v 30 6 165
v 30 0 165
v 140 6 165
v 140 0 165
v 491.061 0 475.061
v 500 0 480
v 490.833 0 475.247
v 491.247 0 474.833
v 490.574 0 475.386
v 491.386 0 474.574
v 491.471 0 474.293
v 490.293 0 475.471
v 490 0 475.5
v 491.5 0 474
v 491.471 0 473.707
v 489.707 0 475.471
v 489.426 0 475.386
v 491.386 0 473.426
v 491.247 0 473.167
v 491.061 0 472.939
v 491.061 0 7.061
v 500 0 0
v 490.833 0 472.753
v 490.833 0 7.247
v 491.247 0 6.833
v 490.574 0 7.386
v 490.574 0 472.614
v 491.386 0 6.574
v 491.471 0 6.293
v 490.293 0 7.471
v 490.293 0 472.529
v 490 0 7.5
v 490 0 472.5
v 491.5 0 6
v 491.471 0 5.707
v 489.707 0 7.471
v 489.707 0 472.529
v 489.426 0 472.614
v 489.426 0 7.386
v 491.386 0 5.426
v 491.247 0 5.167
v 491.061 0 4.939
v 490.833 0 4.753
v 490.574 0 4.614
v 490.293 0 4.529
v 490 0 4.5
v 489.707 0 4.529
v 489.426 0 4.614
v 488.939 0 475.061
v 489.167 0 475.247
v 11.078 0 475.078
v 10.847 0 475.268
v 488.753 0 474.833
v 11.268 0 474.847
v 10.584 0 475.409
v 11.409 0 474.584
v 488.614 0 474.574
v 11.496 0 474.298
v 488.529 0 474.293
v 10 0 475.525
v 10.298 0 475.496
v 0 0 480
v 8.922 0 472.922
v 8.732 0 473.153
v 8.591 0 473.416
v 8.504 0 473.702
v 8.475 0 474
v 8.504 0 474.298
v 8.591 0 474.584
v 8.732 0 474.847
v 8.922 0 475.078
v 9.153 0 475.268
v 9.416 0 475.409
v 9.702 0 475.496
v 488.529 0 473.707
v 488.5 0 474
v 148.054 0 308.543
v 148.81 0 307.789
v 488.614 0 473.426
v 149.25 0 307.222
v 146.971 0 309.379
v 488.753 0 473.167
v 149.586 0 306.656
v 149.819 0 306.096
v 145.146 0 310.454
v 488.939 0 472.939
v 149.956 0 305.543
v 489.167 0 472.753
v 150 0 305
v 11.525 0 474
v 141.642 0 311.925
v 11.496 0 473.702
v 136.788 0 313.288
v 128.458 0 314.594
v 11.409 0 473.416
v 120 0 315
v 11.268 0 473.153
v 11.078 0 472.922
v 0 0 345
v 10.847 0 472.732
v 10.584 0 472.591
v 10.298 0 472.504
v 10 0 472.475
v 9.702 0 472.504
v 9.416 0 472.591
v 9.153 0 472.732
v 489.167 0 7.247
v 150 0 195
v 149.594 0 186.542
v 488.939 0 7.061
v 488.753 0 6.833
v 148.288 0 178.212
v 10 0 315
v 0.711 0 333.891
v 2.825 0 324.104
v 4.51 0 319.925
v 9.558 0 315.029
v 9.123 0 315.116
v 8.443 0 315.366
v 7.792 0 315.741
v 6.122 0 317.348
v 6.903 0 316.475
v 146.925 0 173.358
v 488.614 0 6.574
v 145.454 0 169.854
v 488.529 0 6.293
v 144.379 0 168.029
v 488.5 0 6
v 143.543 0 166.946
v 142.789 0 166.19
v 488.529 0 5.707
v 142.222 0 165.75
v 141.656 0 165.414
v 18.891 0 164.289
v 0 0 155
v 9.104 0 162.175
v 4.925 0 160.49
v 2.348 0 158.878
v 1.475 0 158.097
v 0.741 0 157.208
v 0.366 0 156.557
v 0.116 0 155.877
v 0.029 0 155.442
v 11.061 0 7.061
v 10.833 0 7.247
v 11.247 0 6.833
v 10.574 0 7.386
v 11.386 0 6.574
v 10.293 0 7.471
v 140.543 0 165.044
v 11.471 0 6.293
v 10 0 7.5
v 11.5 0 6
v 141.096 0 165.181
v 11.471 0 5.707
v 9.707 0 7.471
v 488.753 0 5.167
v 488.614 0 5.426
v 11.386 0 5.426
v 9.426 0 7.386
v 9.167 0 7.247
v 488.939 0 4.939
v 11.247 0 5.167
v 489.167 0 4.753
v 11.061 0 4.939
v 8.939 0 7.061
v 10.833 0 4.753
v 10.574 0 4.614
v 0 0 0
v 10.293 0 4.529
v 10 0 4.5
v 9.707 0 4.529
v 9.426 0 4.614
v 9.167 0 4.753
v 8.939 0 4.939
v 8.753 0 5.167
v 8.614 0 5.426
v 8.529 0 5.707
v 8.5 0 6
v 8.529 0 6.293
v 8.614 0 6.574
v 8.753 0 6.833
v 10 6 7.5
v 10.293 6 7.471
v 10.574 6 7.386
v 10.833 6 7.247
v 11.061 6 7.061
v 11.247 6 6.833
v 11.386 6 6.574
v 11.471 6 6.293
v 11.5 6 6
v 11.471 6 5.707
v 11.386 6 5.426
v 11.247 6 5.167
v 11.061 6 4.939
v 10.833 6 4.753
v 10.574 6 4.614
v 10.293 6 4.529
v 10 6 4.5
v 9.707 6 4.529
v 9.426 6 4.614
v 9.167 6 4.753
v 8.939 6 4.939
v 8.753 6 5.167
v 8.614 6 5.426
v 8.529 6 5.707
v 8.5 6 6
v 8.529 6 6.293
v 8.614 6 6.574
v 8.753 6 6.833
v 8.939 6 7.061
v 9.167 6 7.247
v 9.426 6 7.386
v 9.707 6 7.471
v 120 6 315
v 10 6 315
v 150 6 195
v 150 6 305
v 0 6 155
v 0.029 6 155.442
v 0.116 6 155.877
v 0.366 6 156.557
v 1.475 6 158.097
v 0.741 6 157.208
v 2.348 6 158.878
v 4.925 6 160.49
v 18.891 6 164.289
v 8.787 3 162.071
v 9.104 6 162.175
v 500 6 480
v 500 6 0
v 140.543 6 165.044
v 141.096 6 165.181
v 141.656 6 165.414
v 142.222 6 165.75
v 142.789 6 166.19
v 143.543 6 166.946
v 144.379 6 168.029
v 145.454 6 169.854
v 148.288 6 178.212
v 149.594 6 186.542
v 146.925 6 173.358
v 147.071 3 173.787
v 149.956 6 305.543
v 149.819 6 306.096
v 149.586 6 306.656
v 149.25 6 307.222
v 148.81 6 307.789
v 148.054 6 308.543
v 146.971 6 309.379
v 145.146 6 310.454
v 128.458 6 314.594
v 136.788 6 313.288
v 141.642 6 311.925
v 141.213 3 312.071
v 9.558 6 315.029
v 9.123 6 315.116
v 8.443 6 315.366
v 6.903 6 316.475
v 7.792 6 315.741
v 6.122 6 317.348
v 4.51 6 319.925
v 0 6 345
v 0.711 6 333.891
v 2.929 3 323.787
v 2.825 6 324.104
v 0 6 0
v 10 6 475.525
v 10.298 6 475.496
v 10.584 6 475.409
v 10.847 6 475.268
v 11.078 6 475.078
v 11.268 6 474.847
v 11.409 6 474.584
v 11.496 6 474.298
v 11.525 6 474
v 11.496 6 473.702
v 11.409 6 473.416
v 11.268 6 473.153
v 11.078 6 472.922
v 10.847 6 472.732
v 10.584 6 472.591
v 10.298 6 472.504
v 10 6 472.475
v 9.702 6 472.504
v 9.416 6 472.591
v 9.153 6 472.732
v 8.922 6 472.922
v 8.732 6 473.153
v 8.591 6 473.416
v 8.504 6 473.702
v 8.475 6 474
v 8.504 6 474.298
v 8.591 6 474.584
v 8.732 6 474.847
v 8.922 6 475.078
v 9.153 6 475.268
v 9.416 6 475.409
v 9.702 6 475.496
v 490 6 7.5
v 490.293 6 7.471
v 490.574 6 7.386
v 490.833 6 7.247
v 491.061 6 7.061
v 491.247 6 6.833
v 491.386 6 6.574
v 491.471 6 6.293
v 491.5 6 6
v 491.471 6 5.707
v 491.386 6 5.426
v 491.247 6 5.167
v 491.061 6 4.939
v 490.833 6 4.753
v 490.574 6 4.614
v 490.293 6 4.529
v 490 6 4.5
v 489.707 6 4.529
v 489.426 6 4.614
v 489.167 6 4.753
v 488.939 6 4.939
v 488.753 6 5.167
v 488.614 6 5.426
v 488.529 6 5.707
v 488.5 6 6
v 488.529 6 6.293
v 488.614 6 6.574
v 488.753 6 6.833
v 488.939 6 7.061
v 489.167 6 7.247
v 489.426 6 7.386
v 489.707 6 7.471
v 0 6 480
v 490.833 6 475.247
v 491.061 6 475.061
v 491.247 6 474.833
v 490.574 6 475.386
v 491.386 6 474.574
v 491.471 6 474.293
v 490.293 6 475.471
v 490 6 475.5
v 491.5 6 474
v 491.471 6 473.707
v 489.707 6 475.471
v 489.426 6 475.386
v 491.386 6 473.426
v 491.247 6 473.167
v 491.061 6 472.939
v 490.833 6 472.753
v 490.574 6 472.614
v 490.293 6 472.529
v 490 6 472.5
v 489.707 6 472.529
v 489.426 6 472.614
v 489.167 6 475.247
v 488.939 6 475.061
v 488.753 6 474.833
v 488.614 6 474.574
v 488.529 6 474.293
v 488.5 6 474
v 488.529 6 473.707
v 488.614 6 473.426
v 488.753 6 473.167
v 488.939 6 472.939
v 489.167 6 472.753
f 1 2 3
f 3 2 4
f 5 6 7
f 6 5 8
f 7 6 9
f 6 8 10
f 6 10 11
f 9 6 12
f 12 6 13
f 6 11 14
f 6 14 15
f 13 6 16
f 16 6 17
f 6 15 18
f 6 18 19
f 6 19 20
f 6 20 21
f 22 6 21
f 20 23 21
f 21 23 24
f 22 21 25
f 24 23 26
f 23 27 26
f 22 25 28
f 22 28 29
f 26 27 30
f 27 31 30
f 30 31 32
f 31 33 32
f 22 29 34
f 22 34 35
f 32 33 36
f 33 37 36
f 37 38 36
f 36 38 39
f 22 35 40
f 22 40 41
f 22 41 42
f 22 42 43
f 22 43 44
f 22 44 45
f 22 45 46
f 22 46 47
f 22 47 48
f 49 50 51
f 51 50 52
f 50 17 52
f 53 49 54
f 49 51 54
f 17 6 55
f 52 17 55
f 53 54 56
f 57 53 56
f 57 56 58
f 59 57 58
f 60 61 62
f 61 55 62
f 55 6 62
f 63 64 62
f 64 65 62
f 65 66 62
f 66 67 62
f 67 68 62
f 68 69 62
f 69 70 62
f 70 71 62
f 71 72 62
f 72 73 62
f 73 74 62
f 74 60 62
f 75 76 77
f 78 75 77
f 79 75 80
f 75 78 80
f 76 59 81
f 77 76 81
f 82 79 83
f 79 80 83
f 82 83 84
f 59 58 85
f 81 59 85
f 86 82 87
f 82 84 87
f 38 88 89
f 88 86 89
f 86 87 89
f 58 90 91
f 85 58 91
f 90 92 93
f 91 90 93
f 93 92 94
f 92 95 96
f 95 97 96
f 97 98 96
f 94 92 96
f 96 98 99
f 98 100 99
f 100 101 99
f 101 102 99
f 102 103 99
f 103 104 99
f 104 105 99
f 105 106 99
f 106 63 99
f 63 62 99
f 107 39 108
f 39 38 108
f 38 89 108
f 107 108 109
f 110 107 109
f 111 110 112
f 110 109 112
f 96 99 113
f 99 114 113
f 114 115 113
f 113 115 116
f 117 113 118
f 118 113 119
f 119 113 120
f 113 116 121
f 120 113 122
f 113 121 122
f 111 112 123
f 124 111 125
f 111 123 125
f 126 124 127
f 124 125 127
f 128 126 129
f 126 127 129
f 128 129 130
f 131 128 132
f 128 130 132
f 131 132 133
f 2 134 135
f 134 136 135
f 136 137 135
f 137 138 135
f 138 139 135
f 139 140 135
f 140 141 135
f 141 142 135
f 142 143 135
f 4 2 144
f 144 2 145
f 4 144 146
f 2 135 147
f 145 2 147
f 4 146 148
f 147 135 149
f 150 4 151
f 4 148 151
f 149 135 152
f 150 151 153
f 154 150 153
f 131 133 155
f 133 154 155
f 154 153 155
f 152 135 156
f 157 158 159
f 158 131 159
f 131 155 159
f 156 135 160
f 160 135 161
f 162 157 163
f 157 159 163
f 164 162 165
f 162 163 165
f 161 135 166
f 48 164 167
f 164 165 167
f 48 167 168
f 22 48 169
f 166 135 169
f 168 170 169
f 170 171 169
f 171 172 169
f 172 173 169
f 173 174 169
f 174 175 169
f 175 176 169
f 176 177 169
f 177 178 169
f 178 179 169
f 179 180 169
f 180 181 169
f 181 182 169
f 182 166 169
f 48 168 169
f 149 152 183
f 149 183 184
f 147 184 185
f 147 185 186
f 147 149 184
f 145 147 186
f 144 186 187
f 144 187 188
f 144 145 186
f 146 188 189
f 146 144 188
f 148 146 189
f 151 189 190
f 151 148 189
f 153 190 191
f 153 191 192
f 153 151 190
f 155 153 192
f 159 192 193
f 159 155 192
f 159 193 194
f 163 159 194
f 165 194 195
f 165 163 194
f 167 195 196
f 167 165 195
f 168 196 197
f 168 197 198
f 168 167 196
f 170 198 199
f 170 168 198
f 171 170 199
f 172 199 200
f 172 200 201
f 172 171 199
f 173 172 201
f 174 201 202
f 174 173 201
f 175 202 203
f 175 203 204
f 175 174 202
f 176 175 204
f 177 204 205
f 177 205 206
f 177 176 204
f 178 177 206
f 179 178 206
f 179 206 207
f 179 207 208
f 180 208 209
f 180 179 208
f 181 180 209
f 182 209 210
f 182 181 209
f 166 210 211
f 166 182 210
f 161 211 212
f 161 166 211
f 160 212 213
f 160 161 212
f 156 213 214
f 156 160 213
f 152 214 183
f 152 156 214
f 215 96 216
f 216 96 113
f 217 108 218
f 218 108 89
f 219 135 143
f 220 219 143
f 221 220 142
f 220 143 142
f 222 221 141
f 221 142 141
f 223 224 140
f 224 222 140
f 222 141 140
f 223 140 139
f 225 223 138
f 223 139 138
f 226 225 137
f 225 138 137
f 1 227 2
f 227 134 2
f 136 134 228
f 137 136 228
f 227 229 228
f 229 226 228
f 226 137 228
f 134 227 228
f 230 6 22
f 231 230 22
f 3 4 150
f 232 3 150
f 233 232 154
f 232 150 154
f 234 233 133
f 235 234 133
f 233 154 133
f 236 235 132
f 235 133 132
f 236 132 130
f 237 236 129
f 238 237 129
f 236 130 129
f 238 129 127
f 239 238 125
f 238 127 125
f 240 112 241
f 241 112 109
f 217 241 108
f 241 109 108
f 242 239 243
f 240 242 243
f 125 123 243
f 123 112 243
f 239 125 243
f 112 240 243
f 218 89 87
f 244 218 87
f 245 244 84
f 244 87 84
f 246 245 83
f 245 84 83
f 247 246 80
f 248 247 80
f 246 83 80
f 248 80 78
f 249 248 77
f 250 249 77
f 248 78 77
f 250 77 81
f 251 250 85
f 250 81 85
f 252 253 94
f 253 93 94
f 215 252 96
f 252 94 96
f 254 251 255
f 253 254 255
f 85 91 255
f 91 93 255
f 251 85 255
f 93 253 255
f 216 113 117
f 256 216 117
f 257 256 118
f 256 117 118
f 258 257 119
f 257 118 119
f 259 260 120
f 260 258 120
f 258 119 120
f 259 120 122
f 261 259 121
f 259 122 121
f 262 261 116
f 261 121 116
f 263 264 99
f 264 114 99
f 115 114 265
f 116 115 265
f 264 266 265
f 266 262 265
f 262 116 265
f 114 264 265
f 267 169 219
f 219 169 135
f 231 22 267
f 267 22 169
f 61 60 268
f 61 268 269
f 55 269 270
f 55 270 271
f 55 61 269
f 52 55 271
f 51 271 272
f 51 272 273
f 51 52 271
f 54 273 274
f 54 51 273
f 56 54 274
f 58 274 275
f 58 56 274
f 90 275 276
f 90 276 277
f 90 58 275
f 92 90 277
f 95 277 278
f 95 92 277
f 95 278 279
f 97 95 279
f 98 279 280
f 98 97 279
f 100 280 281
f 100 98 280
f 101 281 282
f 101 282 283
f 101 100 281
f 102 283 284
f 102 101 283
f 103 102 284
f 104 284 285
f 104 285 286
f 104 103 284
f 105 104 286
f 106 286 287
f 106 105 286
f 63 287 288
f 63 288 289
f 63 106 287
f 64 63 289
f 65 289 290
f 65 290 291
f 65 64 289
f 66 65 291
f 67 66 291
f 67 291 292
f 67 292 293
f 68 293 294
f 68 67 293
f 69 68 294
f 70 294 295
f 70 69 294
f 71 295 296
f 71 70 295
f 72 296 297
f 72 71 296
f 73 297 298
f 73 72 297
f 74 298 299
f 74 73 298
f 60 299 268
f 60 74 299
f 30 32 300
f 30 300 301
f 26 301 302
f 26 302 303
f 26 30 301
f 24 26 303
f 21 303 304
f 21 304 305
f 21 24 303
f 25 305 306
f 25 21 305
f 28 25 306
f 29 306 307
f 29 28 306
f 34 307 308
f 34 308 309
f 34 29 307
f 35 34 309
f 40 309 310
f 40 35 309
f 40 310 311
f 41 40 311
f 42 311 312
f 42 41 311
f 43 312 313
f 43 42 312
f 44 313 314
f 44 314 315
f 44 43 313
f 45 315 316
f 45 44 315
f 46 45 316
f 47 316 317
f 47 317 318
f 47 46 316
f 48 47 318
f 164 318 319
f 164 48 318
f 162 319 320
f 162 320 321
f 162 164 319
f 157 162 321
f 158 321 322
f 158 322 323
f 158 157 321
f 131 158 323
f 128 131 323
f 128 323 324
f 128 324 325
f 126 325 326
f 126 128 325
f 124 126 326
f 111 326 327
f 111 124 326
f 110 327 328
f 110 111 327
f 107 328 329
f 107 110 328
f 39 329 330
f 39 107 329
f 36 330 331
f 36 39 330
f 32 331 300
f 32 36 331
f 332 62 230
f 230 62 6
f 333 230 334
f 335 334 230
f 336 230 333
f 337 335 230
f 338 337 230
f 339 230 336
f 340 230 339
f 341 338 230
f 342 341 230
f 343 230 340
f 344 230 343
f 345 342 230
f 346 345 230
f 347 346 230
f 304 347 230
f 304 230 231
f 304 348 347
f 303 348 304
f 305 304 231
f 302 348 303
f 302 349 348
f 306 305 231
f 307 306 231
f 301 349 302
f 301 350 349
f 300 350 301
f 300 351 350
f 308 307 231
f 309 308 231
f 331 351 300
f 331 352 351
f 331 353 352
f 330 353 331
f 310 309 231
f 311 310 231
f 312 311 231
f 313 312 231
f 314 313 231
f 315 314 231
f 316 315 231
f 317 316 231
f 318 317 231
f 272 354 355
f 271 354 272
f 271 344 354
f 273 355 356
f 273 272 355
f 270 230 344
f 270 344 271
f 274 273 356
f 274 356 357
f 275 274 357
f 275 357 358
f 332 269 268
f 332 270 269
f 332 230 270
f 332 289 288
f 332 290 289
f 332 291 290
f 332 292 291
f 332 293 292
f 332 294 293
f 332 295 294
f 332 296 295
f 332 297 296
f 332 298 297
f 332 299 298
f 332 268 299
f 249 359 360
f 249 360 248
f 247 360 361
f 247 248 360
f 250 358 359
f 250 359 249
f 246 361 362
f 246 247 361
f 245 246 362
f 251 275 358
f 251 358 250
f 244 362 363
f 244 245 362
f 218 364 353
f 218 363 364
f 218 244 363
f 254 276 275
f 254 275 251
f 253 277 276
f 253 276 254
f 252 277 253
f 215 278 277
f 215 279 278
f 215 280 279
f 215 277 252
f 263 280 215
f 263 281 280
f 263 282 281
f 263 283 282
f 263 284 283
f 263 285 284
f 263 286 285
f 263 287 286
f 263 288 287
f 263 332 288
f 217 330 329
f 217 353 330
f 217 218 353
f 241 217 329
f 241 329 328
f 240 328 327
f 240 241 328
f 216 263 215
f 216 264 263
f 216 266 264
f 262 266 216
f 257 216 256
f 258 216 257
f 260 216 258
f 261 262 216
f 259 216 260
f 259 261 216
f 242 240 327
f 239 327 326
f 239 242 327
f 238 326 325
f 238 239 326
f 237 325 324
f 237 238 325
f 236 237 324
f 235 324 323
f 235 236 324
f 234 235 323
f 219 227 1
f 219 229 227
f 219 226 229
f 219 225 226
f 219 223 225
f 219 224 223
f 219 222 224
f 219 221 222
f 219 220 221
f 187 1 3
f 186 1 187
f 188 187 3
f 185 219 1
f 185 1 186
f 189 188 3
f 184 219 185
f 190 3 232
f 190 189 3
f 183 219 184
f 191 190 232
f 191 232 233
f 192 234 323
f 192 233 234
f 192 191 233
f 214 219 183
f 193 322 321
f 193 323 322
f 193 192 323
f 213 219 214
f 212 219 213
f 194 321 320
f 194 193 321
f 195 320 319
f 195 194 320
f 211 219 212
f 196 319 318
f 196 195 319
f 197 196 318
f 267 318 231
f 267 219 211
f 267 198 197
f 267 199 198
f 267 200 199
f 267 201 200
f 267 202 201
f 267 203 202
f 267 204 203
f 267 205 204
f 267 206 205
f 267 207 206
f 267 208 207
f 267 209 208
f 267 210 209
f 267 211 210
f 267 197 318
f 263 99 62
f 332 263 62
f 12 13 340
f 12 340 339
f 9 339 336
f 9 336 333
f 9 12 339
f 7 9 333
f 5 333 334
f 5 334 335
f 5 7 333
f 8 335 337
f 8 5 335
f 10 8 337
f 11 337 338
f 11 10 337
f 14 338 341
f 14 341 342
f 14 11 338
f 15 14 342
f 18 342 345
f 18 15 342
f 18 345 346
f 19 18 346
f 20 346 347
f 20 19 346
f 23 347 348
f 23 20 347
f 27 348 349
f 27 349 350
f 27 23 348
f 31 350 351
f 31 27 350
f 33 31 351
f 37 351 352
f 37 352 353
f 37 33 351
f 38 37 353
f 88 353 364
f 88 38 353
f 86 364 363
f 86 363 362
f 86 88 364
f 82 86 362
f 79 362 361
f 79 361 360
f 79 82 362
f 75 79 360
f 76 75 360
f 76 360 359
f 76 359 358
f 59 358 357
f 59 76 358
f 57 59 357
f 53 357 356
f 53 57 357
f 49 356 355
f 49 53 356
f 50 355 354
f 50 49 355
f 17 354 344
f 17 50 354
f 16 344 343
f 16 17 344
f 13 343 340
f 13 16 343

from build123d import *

# Parameters (mm, degrees)
SKETCH1_R           = 1.525
SKETCH1_R_2         = 1.5
BOSS_EXTRUDE1_DEPTH = 6
FILLET1_SIZE        = 10
FILLET1_SIZE_2      = 30


with BuildPart() as part:
    # Sketch1 → Boss-Extrude1 (new body)
    with BuildSketch(Plane(origin=(0, 0, 0), x_dir=(1, 0, 0), z_dir=(0, 1, 0))):
        Polygon((500, 0), (0, 0), (0, -165), (150, -165), (150, -315), (0, -315), (0, -480), (500, -480), align=None)
        with Locations(Location((10, -474, 0), (0, 0, 270))):
            Circle(SKETCH1_R, mode=Mode.SUBTRACT)
        with Locations(Location((490, -474, 0), (0, 0, 270))):
            Circle(SKETCH1_R_2, mode=Mode.SUBTRACT)
        with Locations(Location((10, -6, 0), (0, 0, 270))):
            Circle(SKETCH1_R_2, mode=Mode.SUBTRACT)
        with Locations(Location((490, -6, 0), (0, 0, 270))):
            Circle(SKETCH1_R_2, mode=Mode.SUBTRACT)
    extrude(amount=BOSS_EXTRUDE1_DEPTH)

    # Fillet1
    # an asymmetric fillet: 30, 10 mm, written as the material it adds along each edge
    with BuildSketch(Plane(origin=(150, 0, 315), x_dir=(0, 0, -1), z_dir=(0, 1, 0)), Plane(origin=(150, 0, 165), x_dir=(-1, 0, 0), z_dir=(0, 1, 0))) as fillet1_piece_1:
        with BuildLine():
            Bezier((FILLET1_SIZE, 0), (0, 0), (0, FILLET1_SIZE_2), weights=[1, 0.707106781, 1])
            Line((0, FILLET1_SIZE_2), (0, 0))
            Line((0, 0), (FILLET1_SIZE, 0))
        make_face()
    extrude(amount=6)
    # an asymmetric fillet: 30, 10 mm, written as the material it takes off along each edge
    with BuildSketch(Plane(origin=(0, -75, 165), x_dir=(0, 0, -1), z_dir=(0, 1, 0)), Plane(origin=(0, -75, 315), x_dir=(1, 0, 0), z_dir=(0, 1, 0))) as fillet1_2_piece_1:
        with BuildLine():
            Bezier((FILLET1_SIZE, 0), (0, 0), (0, -FILLET1_SIZE_2), weights=[1, 0.707106781, 1])
            Line((0, -FILLET1_SIZE_2), (0, 0))
            Line((0, 0), (FILLET1_SIZE, 0))
        make_face()
    extrude(amount=156, mode=Mode.SUBTRACT)


solid = part.part
